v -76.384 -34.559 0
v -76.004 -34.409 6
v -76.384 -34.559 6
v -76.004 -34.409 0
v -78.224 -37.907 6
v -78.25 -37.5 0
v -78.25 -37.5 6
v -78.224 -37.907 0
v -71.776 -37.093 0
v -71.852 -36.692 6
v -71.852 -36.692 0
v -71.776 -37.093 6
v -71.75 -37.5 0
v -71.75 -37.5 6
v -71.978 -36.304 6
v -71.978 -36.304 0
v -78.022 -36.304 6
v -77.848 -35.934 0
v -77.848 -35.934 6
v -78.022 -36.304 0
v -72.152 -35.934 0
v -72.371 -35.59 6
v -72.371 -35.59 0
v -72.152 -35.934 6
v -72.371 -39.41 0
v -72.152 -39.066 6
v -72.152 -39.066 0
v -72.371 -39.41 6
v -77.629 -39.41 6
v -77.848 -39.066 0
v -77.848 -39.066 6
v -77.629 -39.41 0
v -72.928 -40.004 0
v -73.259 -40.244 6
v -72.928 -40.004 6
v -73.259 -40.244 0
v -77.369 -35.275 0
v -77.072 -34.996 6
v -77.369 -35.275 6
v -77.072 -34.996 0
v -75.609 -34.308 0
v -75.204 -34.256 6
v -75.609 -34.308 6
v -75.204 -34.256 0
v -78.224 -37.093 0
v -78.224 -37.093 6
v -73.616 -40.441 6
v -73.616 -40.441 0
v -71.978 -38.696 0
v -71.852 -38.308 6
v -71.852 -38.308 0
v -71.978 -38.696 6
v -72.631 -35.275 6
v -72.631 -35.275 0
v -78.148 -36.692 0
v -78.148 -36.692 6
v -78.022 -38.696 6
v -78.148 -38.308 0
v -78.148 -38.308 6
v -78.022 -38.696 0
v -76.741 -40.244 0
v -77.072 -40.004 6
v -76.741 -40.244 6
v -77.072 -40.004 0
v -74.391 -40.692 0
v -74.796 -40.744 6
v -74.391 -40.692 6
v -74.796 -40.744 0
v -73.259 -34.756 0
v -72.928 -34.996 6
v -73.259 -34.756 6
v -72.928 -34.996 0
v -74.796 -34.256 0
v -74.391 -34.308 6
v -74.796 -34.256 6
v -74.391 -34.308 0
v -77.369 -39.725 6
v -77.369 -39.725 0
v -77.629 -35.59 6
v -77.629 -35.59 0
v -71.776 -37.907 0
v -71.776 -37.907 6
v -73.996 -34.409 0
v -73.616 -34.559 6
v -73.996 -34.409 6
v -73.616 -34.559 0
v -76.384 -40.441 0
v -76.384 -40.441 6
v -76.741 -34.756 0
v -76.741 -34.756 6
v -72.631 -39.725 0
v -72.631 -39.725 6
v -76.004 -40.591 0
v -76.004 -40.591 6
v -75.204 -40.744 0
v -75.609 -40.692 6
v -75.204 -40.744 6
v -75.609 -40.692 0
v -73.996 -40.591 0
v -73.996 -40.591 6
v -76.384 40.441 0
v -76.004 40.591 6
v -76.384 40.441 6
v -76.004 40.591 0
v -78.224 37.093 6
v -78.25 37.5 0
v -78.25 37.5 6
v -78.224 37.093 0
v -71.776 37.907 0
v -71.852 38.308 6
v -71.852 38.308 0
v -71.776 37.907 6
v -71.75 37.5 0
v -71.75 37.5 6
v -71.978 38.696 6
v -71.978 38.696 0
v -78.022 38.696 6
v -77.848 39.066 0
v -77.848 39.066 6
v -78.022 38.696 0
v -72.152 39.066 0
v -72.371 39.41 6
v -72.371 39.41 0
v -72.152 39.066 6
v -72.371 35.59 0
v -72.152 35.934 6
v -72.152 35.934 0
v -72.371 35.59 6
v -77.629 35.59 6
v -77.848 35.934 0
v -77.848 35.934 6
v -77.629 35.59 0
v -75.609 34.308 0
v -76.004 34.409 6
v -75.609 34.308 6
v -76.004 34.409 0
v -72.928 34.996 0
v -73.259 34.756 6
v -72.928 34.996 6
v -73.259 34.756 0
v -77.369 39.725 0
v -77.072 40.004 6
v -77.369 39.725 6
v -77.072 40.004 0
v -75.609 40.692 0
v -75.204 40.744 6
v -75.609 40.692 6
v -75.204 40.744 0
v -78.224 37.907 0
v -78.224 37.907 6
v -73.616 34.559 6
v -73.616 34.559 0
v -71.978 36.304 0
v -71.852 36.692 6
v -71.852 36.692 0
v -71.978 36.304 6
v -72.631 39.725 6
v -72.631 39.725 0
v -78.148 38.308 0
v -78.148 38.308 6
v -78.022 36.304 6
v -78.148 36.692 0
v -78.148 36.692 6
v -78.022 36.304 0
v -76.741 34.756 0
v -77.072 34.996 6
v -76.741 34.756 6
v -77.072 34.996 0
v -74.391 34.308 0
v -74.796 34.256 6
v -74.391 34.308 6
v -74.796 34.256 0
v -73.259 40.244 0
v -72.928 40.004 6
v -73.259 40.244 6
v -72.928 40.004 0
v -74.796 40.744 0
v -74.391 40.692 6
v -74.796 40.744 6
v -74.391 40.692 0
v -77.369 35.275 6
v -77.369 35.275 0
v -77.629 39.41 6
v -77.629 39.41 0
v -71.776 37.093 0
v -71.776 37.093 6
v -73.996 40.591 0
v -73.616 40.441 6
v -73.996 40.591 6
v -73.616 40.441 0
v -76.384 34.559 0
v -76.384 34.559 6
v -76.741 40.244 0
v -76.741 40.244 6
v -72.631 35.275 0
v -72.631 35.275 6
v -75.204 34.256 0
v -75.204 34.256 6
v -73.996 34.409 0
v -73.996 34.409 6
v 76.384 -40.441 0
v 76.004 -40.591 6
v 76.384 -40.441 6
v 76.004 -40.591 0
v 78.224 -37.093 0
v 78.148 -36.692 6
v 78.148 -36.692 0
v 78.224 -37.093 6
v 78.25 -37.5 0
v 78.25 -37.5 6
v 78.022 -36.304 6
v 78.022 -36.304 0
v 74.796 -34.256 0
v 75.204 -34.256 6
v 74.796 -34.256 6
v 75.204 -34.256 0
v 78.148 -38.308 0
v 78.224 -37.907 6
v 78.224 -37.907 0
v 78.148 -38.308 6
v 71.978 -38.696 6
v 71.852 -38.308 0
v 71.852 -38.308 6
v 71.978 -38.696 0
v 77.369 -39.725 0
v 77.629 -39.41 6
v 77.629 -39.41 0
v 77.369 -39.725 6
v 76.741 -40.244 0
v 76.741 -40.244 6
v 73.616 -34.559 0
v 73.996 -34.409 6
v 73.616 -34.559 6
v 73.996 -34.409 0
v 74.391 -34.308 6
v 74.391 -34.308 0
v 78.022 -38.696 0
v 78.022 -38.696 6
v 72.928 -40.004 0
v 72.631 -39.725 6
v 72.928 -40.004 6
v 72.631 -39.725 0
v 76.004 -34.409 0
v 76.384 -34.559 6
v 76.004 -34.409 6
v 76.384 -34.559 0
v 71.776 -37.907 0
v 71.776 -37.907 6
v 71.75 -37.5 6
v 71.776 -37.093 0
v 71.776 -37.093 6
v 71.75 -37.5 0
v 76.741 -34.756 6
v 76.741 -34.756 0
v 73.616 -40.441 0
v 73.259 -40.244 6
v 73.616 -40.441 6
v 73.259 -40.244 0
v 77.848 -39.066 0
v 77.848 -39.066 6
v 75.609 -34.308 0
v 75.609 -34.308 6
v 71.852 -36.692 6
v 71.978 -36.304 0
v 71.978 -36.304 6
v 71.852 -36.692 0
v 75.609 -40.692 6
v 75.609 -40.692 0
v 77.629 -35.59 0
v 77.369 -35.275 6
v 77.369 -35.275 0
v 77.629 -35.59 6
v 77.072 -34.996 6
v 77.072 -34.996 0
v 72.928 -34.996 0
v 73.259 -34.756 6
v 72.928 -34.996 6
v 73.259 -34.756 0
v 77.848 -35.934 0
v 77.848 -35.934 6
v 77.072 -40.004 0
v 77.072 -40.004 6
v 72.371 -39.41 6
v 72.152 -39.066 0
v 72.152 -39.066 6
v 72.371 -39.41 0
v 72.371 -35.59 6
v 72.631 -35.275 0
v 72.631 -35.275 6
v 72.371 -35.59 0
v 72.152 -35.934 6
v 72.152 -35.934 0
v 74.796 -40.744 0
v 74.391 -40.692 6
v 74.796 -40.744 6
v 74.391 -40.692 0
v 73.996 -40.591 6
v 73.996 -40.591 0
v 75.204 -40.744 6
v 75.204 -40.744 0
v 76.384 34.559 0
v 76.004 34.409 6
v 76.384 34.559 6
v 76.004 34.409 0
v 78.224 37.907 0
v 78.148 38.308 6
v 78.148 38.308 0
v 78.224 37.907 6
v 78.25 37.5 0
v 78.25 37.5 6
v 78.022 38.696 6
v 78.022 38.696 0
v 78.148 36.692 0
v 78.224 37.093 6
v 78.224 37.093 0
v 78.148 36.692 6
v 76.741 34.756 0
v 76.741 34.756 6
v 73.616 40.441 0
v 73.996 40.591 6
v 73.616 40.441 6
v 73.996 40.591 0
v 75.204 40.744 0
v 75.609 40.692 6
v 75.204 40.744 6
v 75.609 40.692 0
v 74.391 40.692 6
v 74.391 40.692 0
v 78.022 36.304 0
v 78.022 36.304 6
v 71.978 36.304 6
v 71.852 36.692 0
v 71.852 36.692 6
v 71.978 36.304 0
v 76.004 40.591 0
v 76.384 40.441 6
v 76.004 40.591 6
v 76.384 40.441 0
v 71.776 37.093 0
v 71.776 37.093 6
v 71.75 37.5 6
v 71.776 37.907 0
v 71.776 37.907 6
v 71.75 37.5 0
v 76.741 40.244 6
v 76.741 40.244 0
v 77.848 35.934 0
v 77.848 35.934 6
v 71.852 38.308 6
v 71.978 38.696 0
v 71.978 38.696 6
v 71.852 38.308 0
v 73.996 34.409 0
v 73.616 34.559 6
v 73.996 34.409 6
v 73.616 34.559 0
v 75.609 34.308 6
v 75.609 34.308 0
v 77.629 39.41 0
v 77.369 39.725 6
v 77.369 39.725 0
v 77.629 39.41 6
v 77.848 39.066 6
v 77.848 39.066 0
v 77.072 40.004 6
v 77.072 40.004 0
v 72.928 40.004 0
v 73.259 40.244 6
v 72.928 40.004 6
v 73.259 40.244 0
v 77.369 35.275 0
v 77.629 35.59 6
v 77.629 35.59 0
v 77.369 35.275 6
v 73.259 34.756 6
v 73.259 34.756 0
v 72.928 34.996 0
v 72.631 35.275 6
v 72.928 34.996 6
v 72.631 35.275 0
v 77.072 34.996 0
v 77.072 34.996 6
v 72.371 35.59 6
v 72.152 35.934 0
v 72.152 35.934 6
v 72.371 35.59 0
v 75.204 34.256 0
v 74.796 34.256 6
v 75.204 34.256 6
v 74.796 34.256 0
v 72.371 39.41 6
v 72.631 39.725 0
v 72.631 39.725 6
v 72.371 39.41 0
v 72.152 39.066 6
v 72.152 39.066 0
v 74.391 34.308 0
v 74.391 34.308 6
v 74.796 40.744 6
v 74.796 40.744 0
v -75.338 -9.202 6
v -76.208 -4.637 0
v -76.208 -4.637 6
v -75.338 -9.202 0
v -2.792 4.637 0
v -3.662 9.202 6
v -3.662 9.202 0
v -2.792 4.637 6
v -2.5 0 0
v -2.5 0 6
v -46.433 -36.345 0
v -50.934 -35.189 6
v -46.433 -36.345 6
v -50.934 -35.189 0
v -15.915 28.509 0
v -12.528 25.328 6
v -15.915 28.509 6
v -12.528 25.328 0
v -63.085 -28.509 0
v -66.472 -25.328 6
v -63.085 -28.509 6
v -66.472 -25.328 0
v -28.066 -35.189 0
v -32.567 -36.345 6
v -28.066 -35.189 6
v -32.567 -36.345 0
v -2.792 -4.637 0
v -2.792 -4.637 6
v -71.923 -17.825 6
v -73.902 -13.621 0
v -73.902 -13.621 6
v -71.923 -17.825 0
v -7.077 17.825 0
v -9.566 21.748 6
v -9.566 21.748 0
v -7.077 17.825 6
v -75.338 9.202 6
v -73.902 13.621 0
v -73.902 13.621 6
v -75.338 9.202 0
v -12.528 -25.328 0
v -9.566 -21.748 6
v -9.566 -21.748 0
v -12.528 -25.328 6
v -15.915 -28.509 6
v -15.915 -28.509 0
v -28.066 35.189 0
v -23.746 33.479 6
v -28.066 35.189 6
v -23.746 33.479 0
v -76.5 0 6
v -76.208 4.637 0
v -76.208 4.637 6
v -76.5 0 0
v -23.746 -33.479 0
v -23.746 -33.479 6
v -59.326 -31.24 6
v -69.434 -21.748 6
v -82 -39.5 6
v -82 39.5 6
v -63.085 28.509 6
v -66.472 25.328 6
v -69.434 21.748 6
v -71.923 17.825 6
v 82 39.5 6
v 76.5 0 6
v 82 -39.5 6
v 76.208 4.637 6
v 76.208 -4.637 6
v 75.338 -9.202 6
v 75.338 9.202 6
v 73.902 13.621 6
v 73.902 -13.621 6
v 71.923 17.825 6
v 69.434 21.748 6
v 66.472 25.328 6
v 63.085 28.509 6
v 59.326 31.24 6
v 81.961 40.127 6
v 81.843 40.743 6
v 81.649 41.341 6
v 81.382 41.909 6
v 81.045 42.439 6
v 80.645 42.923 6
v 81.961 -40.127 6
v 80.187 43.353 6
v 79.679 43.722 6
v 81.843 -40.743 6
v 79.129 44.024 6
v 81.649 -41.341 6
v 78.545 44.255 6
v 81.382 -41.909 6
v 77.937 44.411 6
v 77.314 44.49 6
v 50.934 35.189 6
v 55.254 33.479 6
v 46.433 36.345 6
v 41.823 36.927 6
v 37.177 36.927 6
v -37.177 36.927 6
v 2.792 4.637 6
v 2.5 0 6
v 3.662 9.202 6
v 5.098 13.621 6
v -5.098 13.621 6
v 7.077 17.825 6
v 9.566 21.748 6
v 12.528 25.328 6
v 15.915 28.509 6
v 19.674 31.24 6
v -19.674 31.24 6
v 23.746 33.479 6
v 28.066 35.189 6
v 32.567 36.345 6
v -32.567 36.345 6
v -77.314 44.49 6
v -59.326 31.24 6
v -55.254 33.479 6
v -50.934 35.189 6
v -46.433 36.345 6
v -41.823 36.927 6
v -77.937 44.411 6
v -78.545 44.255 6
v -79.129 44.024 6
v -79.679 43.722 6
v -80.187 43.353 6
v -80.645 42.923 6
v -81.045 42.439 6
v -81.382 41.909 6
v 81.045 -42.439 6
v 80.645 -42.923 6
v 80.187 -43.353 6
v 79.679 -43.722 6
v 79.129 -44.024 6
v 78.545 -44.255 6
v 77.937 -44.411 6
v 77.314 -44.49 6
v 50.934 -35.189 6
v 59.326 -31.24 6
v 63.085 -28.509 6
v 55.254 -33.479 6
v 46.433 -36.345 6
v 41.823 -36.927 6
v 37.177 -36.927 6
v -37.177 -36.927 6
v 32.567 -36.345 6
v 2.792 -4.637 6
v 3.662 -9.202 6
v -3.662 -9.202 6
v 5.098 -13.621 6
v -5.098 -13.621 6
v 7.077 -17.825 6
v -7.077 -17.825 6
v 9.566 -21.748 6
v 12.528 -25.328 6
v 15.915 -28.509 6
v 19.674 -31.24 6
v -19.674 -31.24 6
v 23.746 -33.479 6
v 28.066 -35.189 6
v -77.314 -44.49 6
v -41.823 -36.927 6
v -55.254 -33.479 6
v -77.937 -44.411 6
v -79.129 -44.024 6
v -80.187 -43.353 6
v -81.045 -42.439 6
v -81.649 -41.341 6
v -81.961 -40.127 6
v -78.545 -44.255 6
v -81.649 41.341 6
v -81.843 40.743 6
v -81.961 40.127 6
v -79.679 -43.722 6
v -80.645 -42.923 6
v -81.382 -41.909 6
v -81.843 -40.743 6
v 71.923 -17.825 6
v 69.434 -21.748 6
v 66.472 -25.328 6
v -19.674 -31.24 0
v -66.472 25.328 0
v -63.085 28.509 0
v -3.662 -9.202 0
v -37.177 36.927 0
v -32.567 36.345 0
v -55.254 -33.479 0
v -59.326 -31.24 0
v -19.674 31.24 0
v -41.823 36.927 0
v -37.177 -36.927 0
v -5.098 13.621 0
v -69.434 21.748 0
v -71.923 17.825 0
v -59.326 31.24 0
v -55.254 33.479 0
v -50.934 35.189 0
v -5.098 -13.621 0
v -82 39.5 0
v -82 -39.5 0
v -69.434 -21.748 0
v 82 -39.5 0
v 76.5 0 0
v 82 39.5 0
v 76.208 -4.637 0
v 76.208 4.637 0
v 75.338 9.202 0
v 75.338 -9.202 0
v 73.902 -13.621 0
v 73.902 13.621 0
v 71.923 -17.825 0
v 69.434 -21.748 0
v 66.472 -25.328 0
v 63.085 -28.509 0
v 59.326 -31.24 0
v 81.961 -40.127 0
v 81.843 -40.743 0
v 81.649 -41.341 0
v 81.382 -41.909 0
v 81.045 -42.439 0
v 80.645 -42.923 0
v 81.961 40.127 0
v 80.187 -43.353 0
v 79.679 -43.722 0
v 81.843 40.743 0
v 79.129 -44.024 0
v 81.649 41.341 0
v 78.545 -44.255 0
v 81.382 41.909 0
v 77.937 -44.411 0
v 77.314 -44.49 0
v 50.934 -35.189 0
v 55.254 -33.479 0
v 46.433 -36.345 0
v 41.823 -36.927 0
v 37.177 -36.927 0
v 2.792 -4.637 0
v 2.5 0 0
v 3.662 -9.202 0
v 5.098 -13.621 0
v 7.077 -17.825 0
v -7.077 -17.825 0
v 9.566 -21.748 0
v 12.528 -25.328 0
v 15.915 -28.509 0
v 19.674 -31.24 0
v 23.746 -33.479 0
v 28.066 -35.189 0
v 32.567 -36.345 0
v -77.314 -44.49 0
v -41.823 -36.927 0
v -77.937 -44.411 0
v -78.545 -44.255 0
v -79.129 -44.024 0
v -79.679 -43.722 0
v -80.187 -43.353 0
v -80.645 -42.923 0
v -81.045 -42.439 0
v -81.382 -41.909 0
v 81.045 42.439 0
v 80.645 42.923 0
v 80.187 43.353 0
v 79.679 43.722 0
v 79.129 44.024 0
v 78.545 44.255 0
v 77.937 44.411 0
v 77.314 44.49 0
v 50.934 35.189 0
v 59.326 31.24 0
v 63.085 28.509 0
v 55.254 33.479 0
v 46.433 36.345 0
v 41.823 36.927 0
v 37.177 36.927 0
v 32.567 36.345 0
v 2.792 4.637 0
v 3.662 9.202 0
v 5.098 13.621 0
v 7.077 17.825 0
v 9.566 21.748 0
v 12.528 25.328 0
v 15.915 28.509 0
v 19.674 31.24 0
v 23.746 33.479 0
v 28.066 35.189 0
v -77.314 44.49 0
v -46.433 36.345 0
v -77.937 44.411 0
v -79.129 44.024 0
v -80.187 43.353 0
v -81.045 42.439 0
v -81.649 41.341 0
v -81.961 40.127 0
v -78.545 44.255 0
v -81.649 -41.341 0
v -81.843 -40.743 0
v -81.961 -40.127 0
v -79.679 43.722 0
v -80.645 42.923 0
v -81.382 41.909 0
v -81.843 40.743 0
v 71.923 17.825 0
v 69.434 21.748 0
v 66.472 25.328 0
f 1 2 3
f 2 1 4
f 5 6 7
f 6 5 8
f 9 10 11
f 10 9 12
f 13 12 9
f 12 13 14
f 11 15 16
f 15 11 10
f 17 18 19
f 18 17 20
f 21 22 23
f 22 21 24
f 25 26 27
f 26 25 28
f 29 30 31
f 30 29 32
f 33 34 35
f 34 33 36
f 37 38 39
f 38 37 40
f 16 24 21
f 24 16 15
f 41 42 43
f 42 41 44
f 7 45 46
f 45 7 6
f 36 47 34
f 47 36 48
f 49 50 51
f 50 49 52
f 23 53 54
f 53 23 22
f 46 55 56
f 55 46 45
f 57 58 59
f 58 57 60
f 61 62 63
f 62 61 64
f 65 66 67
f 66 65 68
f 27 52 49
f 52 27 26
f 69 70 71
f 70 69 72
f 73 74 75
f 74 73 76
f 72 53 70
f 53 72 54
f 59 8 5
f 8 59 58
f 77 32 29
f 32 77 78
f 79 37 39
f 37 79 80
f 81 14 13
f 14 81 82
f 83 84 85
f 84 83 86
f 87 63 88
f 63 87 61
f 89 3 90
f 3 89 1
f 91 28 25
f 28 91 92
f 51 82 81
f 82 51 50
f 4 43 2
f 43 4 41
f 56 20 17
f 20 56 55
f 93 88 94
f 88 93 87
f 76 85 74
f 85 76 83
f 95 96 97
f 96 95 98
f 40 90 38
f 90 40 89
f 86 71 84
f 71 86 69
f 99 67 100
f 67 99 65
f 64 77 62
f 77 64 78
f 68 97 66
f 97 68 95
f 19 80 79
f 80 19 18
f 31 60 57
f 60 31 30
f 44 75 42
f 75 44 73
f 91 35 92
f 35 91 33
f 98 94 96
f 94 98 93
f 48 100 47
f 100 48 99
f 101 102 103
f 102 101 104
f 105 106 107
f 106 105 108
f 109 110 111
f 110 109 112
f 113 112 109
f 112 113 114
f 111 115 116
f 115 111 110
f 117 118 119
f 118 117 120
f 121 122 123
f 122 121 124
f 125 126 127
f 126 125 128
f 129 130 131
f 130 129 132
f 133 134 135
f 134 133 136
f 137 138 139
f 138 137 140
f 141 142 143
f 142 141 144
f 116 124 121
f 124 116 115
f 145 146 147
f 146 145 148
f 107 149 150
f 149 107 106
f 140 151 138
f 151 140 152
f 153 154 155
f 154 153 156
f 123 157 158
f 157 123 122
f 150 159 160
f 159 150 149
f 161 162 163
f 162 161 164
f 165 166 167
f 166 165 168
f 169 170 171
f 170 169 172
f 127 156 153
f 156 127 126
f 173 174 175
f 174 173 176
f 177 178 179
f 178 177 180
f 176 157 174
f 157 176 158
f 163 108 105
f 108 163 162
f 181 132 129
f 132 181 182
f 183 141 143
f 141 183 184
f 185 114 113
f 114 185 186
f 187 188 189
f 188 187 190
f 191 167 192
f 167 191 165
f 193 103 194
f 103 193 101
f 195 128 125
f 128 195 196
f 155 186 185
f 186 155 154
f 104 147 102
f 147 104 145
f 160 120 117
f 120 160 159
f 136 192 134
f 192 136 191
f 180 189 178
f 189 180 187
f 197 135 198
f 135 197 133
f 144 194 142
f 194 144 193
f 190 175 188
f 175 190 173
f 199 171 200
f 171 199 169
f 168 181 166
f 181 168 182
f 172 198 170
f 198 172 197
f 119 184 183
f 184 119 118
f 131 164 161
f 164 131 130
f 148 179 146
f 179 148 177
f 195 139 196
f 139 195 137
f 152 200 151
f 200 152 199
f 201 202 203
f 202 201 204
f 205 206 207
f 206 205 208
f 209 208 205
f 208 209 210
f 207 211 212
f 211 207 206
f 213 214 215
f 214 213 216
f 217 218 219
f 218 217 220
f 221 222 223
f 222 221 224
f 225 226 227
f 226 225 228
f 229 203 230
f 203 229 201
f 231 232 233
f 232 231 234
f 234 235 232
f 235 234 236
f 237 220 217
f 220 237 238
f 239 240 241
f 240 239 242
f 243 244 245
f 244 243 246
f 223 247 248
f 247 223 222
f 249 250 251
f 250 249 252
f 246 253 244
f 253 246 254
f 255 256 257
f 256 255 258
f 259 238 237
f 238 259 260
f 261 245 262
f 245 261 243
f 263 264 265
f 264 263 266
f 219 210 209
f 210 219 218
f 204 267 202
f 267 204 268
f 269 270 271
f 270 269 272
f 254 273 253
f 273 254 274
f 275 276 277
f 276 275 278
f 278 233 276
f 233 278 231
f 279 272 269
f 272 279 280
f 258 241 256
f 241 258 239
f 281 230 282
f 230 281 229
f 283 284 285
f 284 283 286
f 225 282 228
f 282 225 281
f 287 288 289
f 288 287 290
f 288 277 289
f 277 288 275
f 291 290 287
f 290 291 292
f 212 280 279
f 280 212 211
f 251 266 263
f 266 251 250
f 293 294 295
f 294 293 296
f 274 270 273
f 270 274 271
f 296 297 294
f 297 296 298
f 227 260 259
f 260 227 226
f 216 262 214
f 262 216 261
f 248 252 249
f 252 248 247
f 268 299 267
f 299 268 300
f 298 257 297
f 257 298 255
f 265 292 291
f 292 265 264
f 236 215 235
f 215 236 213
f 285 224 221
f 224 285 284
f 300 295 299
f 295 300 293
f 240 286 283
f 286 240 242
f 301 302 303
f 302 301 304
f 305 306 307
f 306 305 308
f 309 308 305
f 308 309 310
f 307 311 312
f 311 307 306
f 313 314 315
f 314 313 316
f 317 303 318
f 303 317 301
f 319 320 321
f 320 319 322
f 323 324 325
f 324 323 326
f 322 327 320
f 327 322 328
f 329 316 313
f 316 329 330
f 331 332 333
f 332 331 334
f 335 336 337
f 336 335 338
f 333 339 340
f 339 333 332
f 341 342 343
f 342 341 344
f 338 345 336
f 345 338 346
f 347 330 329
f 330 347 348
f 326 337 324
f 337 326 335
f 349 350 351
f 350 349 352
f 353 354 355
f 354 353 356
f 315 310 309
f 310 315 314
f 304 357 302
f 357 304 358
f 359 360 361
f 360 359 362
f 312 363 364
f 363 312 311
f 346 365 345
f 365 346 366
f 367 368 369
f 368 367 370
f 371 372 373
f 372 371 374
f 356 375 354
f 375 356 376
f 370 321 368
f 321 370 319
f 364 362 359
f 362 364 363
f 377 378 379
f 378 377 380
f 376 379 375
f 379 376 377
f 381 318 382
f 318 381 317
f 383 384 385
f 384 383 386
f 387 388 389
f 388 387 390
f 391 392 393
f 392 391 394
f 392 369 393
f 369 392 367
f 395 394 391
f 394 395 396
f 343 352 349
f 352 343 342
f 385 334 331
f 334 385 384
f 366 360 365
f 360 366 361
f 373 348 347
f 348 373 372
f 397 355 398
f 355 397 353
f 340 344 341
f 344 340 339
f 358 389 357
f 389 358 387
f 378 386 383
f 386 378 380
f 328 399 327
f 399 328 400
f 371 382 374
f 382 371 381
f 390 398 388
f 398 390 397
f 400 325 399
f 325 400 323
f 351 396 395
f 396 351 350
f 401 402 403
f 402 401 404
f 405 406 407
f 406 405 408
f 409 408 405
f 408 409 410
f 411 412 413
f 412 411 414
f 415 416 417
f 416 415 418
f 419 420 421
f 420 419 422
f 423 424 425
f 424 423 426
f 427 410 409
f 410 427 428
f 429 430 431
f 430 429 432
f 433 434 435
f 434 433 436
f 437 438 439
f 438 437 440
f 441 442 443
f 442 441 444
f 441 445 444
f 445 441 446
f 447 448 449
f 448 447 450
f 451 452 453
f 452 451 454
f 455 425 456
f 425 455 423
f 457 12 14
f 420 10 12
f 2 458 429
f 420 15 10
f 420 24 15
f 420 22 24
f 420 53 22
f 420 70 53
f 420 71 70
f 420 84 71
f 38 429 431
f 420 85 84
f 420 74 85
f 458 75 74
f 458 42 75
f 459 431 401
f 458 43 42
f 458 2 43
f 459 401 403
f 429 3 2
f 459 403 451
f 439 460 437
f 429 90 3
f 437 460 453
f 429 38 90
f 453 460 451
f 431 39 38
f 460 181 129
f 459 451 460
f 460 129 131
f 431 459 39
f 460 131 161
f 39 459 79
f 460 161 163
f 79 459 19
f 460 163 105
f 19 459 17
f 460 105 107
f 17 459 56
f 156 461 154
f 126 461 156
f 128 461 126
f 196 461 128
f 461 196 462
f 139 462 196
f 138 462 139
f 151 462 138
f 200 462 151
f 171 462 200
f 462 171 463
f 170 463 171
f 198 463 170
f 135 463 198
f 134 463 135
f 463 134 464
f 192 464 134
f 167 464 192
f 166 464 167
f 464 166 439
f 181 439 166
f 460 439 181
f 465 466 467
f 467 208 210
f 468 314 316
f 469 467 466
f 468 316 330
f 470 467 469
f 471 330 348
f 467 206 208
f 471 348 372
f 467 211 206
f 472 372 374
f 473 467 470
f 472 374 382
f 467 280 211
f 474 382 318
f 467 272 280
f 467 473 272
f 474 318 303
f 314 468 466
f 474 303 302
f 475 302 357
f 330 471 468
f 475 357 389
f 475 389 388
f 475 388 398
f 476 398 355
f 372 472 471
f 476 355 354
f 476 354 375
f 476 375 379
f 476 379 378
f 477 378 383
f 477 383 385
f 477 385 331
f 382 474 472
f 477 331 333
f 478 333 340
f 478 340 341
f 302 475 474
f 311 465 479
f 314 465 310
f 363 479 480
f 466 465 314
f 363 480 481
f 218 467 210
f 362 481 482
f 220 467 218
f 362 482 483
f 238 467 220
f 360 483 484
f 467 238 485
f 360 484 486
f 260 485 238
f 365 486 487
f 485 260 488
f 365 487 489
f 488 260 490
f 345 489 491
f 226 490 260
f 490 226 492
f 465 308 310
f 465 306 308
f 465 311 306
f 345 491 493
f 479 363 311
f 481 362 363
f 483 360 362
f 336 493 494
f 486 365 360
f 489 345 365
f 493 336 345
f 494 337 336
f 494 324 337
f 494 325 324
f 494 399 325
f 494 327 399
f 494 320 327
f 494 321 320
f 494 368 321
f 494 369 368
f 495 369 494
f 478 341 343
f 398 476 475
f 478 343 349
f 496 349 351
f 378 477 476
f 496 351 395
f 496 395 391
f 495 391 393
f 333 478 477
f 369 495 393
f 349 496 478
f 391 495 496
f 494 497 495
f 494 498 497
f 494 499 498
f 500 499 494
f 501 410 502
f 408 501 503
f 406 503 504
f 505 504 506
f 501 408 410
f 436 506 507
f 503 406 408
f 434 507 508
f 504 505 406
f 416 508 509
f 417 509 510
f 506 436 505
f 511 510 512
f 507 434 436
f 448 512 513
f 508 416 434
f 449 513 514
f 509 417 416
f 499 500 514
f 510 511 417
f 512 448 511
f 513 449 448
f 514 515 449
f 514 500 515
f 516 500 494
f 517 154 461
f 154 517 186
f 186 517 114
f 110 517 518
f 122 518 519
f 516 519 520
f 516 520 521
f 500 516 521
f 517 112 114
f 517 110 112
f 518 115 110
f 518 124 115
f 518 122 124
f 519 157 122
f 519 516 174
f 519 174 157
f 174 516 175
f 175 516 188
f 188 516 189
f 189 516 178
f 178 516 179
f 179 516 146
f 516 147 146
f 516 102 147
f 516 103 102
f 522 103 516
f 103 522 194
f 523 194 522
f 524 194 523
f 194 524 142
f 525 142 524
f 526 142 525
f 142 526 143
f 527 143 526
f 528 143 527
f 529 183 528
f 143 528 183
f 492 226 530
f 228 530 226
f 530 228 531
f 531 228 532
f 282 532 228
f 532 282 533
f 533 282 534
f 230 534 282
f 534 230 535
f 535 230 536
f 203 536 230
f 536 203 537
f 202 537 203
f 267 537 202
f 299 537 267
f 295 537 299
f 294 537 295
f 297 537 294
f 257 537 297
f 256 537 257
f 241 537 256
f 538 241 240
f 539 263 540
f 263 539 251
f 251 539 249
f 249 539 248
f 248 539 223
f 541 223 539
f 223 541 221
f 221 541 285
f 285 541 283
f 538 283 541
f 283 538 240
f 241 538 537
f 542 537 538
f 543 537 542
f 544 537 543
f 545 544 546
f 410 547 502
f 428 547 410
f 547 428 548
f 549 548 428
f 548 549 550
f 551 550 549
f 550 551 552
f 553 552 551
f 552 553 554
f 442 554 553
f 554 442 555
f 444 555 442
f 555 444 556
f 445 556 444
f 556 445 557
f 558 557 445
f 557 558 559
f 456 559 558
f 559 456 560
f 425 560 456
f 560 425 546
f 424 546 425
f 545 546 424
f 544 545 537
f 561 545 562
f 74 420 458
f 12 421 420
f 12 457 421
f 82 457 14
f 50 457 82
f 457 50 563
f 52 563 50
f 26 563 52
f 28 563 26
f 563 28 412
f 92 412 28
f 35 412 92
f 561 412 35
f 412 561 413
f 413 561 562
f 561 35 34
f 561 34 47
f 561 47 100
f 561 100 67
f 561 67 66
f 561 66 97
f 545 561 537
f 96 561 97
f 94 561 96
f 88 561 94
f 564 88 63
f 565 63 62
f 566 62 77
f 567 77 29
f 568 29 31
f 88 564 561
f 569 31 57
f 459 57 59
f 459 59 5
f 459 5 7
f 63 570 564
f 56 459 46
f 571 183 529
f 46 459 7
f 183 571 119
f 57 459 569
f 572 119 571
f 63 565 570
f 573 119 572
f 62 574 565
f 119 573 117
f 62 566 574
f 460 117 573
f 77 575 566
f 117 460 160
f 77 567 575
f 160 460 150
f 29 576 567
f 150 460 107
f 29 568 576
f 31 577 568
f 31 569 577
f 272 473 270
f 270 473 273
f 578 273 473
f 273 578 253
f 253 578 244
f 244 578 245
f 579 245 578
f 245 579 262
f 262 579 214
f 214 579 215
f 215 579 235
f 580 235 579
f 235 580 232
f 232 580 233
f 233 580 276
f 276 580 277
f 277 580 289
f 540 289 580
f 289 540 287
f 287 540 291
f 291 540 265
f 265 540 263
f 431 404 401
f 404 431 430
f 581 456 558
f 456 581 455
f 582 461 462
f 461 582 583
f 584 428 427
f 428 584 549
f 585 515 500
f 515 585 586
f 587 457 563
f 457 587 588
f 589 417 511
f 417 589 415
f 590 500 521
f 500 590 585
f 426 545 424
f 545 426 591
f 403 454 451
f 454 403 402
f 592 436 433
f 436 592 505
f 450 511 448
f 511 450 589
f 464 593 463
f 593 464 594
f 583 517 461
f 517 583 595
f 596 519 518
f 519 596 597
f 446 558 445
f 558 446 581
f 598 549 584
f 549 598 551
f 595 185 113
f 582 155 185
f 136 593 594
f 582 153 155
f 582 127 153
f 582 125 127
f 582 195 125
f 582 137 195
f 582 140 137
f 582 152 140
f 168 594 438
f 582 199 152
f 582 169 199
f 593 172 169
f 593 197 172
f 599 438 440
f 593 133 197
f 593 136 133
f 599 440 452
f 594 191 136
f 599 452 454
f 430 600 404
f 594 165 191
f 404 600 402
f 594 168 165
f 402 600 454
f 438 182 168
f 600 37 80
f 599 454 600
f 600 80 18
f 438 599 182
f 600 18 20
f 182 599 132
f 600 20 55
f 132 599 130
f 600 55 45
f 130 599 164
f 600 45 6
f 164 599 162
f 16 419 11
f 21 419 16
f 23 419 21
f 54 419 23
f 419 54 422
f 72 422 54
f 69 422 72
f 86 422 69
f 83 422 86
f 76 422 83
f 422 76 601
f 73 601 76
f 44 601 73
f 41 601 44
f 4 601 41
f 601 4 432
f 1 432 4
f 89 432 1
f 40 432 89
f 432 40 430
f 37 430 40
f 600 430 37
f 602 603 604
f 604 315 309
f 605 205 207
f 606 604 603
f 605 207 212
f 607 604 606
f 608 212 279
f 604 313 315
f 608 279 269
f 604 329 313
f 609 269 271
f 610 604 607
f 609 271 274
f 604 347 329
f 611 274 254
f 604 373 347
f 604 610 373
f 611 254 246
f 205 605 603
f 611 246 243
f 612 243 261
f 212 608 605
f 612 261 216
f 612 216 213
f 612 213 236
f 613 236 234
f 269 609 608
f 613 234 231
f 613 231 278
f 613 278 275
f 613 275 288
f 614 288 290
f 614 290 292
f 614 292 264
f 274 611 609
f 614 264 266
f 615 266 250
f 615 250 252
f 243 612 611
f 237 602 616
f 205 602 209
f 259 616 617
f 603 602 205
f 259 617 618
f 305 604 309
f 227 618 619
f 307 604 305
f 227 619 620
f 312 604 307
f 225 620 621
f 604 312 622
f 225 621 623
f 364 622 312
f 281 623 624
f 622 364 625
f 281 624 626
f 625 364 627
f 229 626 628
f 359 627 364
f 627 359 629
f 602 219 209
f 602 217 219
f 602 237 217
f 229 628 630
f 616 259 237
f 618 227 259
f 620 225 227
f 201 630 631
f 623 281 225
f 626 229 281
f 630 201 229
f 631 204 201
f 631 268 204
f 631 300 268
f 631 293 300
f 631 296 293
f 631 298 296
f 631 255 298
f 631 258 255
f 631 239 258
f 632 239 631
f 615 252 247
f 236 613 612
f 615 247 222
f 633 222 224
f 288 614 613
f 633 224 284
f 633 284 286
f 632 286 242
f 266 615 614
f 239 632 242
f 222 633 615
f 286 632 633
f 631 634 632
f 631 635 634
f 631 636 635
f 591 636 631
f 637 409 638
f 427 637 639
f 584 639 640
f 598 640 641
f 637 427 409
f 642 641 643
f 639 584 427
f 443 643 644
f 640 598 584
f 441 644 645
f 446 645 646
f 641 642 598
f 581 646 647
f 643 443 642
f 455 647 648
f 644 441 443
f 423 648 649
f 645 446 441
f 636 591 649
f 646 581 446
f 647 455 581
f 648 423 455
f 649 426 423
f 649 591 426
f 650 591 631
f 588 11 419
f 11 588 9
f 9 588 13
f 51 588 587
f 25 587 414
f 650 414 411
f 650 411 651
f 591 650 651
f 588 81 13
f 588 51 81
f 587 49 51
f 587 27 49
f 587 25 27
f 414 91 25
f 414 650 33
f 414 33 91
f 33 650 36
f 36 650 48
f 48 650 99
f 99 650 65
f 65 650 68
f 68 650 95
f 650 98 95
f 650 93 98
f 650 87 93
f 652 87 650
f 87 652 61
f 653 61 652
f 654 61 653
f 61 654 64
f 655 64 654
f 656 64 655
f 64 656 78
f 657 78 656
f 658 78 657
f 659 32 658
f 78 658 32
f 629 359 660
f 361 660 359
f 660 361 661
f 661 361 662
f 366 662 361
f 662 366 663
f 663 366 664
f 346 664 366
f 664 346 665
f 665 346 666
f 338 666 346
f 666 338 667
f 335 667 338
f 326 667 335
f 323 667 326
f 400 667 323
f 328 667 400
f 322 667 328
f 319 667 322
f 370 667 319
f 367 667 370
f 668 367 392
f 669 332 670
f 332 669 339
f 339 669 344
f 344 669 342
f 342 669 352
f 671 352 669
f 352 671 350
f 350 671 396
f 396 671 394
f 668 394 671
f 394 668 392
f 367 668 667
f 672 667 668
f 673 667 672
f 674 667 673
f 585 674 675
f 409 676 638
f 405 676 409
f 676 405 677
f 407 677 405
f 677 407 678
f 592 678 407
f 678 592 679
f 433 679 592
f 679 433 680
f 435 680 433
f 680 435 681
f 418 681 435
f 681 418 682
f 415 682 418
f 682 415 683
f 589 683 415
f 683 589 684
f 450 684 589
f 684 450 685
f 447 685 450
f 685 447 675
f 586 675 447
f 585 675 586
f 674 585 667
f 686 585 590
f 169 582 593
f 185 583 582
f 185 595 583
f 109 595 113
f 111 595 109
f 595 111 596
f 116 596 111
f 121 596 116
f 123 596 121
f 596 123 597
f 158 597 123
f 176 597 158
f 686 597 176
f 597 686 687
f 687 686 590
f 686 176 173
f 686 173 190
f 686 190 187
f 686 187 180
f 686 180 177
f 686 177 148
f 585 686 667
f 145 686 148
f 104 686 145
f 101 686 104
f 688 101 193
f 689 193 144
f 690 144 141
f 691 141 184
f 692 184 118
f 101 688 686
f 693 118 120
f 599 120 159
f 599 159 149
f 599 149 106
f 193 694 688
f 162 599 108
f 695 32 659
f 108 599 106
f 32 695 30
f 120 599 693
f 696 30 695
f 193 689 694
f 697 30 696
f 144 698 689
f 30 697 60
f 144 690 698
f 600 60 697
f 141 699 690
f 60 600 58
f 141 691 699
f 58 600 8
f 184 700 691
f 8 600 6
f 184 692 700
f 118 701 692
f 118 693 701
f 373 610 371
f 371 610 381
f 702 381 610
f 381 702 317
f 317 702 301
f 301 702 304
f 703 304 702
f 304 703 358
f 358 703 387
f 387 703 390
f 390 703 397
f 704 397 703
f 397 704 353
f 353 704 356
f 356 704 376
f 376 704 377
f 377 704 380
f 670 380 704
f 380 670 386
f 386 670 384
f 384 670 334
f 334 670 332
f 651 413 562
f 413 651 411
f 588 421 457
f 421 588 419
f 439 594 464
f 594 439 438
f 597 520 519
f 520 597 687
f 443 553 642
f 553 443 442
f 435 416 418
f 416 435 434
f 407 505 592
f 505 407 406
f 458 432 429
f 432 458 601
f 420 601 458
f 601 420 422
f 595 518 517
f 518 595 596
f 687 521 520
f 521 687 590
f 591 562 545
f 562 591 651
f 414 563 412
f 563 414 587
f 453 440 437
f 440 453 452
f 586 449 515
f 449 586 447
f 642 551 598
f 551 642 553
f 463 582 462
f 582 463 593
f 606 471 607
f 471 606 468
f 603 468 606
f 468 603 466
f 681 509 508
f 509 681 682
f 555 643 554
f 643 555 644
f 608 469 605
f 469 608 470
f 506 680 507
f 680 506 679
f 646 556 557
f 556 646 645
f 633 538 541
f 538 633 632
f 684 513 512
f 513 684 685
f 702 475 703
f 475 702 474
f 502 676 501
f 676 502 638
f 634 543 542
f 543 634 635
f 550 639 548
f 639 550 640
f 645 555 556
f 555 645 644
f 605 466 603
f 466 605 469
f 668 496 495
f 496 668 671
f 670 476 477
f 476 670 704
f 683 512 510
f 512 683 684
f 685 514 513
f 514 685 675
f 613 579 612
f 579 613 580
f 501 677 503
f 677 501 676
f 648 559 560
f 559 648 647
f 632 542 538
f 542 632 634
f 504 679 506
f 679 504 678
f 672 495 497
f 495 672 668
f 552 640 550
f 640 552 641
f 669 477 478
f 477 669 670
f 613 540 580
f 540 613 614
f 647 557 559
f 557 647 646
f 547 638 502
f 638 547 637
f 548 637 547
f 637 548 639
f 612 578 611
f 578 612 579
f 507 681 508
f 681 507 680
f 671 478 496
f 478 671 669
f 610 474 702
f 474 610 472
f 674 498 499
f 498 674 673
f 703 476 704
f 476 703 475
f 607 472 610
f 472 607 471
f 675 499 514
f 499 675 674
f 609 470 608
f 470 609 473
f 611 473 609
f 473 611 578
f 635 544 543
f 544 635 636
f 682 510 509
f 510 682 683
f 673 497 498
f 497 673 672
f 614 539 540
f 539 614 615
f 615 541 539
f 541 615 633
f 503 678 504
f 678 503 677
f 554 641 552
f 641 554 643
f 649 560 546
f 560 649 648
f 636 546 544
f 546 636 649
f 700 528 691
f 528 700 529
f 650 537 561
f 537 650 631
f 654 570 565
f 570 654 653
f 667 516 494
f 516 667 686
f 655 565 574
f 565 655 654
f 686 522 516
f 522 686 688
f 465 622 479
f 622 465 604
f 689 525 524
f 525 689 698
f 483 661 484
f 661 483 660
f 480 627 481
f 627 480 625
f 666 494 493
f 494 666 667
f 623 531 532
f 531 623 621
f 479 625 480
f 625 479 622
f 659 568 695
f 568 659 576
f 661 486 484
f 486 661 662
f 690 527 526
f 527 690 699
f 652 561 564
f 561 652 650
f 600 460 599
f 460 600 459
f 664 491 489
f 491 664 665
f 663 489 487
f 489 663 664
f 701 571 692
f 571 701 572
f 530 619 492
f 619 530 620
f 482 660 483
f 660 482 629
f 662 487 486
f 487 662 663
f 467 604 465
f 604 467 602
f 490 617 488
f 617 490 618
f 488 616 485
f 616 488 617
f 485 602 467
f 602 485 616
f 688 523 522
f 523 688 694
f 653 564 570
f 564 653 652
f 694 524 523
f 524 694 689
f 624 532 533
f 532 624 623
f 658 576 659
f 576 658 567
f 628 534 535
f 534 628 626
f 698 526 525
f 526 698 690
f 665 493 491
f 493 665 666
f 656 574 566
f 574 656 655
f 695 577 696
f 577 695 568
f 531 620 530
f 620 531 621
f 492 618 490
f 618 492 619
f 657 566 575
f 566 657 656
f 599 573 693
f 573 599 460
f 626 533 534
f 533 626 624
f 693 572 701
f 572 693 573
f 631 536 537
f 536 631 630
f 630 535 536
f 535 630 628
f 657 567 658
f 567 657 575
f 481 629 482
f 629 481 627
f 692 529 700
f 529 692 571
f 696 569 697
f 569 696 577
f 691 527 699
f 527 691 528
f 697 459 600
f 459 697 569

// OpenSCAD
$fn = 50;


difference() {
	union() {
		hull() {
			translate(v = [-77.0000000000, 39.5000000000, 0]) {
				cylinder(h = 6, r = 5);
			}
			translate(v = [77.0000000000, 39.5000000000, 0]) {
				cylinder(h = 6, r = 5);
			}
			translate(v = [-77.0000000000, -39.5000000000, 0]) {
				cylinder(h = 6, r = 5);
			}
			translate(v = [77.0000000000, -39.5000000000, 0]) {
				cylinder(h = 6, r = 5);
			}
		}
	}
	union() {
		#translate(v = [-75.0000000000, -37.5000000000, -100.0000000000]) {
			cylinder(h = 200, r = 3.2500000000);
		}
		#translate(v = [-75.0000000000, 37.5000000000, -100.0000000000]) {
			cylinder(h = 200, r = 3.2500000000);
		}
		#translate(v = [75.0000000000, -37.5000000000, -100.0000000000]) {
			cylinder(h = 200, r = 3.2500000000);
		}
		#translate(v = [75.0000000000, 37.5000000000, -100.0000000000]) {
			cylinder(h = 200, r = 3.2500000000);
		}
		#translate(v = [-39.5000000000, 0, 0]) {
			cylinder(h = 6, r = 37.0000000000);
		}
		#translate(v = [39.5000000000, 0, 0]) {
			cylinder(h = 6, r = 37.0000000000);
		}
	}
}
